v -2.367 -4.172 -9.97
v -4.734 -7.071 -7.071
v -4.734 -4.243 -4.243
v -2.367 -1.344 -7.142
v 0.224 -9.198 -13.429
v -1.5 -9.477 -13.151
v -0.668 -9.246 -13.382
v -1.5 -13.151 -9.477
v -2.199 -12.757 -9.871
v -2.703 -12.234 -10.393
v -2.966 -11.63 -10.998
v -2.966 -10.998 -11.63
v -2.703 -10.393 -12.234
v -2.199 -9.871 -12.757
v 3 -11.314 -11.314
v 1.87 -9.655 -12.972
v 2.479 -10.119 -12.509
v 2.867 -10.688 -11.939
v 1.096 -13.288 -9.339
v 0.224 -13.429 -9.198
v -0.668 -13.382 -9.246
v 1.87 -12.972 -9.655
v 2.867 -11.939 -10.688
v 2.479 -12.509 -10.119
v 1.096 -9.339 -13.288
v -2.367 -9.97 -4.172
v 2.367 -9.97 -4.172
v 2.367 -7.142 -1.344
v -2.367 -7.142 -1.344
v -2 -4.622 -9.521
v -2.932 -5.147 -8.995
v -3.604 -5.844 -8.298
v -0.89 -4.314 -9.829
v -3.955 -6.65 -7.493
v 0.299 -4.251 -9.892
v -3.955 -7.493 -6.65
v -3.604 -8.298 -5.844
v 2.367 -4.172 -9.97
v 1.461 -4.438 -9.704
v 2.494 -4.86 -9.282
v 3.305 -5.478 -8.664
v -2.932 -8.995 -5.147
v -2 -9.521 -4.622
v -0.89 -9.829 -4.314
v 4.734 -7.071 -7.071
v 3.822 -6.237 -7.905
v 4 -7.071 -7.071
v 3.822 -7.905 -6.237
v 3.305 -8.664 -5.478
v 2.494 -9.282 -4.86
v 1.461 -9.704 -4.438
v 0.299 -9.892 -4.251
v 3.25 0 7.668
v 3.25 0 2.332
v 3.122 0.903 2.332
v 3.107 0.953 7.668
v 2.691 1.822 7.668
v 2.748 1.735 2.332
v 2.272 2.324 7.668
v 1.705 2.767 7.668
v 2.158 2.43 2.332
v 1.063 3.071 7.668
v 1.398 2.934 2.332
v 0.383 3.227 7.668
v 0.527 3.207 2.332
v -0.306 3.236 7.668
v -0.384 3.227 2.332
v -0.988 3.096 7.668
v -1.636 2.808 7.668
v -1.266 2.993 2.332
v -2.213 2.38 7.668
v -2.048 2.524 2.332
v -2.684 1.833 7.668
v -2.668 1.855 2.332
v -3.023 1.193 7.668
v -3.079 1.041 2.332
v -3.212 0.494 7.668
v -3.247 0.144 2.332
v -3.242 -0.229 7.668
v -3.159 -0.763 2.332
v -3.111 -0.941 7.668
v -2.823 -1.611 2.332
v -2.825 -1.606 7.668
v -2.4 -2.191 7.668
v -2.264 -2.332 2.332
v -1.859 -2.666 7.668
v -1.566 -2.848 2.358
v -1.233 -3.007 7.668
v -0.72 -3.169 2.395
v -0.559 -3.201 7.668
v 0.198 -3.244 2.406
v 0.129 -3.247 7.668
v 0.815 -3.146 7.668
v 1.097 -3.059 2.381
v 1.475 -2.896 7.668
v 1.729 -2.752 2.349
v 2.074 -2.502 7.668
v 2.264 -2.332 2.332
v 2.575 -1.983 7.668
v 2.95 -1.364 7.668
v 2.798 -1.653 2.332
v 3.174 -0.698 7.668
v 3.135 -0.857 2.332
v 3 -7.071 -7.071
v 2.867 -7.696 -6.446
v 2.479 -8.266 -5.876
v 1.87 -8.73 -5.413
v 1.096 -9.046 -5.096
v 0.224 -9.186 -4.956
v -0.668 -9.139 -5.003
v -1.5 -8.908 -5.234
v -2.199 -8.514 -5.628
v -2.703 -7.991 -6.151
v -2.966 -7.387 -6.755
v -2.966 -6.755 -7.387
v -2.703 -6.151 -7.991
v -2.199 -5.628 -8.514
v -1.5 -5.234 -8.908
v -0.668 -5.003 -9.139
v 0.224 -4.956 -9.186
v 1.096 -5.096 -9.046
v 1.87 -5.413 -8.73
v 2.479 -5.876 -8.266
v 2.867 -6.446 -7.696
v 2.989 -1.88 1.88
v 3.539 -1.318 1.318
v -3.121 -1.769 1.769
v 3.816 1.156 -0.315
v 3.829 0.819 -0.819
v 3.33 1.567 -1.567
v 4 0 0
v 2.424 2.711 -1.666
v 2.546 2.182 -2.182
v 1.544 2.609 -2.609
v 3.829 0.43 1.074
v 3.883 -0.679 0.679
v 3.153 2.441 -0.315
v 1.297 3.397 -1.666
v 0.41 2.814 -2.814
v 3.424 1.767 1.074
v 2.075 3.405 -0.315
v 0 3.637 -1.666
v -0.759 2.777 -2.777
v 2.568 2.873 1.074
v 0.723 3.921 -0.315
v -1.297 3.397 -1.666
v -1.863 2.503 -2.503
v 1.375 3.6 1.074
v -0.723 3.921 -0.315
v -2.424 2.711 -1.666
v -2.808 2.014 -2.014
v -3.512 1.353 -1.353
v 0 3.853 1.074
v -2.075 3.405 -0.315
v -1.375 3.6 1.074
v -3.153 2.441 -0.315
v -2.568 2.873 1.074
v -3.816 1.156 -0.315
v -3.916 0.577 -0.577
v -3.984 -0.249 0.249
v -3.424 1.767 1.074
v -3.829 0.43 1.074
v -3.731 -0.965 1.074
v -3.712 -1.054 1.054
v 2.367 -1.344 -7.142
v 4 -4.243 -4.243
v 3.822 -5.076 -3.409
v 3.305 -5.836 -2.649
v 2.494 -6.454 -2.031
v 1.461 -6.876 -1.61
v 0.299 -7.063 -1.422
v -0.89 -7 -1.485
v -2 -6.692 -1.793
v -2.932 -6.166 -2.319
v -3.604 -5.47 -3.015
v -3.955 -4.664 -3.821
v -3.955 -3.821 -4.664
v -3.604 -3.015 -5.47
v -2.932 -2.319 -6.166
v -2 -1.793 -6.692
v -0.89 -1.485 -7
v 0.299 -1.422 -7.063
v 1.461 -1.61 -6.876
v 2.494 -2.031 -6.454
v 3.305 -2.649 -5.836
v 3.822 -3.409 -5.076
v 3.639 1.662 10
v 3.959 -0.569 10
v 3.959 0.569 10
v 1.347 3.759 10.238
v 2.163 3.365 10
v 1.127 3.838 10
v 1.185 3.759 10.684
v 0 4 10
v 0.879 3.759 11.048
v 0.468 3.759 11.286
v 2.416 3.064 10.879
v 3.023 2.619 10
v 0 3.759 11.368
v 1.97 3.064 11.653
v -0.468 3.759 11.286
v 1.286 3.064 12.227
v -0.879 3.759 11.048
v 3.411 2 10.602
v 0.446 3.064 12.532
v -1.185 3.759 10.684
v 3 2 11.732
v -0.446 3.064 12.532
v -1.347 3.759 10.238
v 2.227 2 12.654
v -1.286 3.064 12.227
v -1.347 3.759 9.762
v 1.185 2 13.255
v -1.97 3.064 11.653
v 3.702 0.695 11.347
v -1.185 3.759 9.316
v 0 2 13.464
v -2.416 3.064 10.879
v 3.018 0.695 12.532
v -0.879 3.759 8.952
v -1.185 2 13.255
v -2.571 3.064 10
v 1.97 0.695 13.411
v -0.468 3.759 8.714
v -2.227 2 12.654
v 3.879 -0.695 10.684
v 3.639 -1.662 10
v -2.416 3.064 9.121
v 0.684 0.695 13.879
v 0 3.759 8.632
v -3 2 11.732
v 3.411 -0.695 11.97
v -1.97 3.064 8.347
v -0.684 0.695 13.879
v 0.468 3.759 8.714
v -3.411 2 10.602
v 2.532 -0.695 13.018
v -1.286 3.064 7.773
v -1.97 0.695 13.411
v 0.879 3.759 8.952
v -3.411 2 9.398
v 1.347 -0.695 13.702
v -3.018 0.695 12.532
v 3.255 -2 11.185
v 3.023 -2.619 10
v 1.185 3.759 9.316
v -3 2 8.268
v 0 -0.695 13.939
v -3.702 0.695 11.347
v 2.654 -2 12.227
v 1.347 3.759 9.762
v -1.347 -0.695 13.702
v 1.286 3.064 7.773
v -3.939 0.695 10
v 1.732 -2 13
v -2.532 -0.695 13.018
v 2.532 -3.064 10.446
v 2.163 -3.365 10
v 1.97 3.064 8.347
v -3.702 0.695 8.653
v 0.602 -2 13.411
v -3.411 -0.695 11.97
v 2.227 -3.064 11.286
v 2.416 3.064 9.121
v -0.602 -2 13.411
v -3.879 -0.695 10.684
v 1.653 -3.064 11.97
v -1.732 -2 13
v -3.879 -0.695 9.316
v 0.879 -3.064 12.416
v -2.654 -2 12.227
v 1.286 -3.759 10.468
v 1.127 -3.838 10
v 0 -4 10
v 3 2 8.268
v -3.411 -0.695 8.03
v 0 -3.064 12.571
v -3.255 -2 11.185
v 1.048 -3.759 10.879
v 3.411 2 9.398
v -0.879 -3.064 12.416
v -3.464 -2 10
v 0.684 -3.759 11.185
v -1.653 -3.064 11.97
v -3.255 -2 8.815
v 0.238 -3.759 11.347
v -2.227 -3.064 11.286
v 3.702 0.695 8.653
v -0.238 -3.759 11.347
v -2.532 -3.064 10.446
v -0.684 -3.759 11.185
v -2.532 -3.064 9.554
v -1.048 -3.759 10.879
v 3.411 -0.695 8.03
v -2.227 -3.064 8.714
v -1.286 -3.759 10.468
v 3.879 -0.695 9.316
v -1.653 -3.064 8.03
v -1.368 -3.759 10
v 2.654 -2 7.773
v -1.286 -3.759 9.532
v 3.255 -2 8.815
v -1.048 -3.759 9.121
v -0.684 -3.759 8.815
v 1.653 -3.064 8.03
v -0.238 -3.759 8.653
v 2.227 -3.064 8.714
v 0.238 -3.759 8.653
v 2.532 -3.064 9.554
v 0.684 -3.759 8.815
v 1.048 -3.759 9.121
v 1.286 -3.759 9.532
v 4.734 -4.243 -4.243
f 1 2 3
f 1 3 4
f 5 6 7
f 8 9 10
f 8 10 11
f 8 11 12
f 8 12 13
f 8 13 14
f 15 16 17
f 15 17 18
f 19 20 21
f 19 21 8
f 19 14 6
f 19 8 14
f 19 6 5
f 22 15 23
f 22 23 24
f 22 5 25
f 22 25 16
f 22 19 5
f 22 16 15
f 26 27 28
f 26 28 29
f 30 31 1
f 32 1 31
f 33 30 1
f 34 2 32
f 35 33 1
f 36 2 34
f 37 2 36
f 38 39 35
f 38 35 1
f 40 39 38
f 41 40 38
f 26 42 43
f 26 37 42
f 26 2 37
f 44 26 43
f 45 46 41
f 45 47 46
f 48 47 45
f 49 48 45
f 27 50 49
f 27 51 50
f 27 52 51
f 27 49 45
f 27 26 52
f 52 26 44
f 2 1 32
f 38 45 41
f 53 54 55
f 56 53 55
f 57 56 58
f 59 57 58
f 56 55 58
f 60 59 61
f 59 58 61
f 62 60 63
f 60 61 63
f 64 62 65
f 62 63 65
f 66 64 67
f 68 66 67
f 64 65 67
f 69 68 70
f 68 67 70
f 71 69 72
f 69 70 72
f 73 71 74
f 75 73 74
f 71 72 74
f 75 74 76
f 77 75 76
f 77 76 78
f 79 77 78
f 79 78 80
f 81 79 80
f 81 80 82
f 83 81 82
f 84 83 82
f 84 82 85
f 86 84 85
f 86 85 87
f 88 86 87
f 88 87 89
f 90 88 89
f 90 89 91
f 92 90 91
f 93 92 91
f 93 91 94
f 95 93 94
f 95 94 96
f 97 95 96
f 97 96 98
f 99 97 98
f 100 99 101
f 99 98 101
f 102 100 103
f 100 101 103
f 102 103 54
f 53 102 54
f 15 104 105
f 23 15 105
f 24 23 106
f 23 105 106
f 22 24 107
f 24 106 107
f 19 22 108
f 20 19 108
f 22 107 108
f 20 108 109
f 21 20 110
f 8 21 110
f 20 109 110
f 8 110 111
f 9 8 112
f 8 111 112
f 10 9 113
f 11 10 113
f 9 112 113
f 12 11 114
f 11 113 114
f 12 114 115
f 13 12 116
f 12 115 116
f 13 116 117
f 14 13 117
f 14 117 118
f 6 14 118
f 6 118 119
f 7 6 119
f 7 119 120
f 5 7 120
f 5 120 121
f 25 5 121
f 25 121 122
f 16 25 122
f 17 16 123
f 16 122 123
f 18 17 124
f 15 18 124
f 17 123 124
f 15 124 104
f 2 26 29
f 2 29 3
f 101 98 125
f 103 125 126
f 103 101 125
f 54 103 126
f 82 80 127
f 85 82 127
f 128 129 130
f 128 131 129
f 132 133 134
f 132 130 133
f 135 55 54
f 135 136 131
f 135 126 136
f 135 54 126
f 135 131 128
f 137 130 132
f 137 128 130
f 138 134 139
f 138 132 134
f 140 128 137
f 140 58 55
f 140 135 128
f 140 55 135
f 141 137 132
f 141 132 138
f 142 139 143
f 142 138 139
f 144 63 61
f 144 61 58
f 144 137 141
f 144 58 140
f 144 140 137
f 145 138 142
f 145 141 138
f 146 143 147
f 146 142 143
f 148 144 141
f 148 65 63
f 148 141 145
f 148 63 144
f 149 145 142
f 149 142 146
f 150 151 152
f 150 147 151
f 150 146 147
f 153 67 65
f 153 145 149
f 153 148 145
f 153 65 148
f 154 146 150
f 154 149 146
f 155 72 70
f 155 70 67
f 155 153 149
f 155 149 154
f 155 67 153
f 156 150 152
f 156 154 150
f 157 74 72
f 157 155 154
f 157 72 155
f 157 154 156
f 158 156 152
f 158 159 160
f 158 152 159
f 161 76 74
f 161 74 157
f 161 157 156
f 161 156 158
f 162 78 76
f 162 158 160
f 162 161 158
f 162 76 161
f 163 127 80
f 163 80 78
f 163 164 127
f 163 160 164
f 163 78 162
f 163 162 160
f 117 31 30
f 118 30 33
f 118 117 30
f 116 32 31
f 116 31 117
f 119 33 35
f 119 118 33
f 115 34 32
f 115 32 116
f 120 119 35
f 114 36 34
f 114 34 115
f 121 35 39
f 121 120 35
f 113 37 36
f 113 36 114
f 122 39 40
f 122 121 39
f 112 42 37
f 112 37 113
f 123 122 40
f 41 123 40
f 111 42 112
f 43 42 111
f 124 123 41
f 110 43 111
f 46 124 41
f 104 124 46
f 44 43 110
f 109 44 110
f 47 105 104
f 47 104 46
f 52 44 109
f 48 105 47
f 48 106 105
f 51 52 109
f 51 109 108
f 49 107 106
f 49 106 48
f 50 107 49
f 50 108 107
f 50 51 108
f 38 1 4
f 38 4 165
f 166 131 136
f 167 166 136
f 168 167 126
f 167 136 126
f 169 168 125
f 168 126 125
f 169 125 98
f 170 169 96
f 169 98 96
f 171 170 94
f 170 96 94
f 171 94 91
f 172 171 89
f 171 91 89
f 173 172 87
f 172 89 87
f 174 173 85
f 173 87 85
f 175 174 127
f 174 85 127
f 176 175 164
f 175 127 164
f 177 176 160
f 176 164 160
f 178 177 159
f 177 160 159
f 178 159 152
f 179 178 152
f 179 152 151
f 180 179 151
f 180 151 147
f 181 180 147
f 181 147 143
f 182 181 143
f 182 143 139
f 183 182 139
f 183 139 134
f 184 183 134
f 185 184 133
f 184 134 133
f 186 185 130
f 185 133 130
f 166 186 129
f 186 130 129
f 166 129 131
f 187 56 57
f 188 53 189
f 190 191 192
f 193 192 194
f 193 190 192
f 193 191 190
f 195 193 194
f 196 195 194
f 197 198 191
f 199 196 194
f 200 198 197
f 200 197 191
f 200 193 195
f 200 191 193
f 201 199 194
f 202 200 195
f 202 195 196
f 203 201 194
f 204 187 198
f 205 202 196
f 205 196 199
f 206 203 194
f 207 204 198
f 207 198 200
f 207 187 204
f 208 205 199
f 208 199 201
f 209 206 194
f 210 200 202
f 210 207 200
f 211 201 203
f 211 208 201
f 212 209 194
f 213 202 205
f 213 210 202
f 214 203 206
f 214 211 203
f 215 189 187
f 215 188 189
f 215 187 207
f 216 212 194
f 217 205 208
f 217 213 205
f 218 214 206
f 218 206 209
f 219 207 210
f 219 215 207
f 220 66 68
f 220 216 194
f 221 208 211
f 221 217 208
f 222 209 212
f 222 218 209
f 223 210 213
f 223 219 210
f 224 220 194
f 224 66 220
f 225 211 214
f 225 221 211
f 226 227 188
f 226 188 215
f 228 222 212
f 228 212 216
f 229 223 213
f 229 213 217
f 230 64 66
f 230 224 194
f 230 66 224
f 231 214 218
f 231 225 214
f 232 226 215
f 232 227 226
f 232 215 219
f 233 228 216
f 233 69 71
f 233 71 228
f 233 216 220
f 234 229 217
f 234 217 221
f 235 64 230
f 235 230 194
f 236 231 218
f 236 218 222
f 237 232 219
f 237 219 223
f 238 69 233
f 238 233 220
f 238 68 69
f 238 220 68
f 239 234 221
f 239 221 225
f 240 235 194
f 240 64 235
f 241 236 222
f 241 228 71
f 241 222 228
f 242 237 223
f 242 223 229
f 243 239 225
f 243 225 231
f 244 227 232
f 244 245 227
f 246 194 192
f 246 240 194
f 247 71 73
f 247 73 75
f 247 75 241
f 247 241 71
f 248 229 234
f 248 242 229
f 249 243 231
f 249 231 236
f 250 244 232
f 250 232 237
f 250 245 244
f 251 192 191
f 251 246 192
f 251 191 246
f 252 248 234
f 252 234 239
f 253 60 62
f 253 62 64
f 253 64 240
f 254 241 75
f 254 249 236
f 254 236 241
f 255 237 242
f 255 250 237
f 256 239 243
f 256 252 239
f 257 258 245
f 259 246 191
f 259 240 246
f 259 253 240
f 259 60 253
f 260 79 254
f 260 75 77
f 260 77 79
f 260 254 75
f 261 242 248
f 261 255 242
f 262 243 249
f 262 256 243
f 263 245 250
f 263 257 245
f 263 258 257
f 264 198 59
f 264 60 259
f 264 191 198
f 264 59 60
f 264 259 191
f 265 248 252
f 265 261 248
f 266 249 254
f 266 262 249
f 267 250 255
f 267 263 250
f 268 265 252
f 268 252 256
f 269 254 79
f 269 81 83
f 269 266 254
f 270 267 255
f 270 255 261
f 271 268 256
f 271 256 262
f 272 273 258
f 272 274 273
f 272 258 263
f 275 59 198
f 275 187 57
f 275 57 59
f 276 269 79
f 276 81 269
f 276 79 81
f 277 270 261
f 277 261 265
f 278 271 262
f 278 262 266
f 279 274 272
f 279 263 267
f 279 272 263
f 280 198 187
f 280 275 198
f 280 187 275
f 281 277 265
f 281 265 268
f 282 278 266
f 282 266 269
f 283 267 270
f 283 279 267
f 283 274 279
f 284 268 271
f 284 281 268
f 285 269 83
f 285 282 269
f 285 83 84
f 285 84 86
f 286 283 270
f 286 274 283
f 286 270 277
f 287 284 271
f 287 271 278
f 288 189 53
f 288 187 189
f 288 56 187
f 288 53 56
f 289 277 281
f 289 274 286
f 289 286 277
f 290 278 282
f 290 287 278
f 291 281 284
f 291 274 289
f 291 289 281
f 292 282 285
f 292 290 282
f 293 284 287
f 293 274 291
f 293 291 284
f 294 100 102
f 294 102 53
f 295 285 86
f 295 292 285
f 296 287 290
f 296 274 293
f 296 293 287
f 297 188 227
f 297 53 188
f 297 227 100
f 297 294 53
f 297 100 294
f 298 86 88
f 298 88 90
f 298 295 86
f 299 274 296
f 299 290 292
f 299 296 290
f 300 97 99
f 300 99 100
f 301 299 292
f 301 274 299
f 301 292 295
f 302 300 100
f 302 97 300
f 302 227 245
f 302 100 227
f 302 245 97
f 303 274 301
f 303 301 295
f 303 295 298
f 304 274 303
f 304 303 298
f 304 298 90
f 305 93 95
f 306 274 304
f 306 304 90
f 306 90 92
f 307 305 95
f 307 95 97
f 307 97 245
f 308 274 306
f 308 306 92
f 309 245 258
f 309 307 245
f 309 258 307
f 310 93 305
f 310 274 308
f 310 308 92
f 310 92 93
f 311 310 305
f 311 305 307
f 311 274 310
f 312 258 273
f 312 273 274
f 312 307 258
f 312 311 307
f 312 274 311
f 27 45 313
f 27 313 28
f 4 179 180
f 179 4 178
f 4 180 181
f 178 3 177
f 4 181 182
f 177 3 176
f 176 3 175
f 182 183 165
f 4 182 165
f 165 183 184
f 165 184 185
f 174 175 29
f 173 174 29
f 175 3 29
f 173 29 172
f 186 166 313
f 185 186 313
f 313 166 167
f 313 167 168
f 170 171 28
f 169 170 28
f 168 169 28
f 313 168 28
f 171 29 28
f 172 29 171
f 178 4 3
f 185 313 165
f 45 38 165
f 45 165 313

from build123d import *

# Parameters (mm, degrees)
SKETCH_R     = 3.25
PAD_DEPTH    = 10
SKETCH001_R  = 4
PAD001_DEPTH = 10
SKETCH002_R  = 3
PAD002_DEPTH = 6
PAD003_DEPTH = 4


with BuildPart() as part:
    # Sketch → Pad (new body)
    with BuildSketch(Plane.XY):
        Circle(SKETCH_R)
    extrude(amount=PAD_DEPTH)

    # Sketch001 → Pad001 (join)
    with BuildSketch(Plane(origin=(0, 0, 0), x_dir=(1, 0, 0), z_dir=(0, -0.707107, -0.707107))):
        Circle(SKETCH001_R)
    extrude(amount=PAD001_DEPTH)

    # Sphere → Sphere (revolve)
    with BuildSketch(Plane.XZ):
        with BuildLine():
            ThreePointArc((0, -4), (4, 0), (0, 4))
            Line((0, 4), (0, -4))
        make_face()
    revolve(axis=Axis((0, 0, 0), (0, 0, 1)))

    # Sphere001 → Sphere001 (revolve)
    with BuildSketch(Plane(origin=(0, 0, 10), x_dir=(1, 0, 0), z_dir=(0, 0, -1))):
        with BuildLine():
            ThreePointArc((0, -4), (4, 0), (0, 4))
            Line((0, 4), (0, -4))
        make_face()
    revolve(axis=Axis((0, 0, 10), (0, -1, 0)))

    # Sketch002 (on Face6 of Sphere001) → Pad002 (join)
    with BuildSketch(Plane(origin=(0, -12.071068, -2.071068), x_dir=(1, 0, 0), z_dir=(0, -0.707107, -0.707107))):
        with Locations((0, -7.071068)):
            Circle(SKETCH002_R)
    extrude(amount=PAD002_DEPTH)

    # Sketch003 (on Face6 of Pad002) → Pad003 (join)
    with BuildSketch(Plane(origin=(0, -12.071068, -2.071068), x_dir=(1, 0, 0), z_dir=(0, -0.707107, -0.707107))):
        Polygon((2.367136, -2.971068), (-2.367136, -2.971068), (-4.734272, -7.071068), (-2.367136, -11.171068), (2.367136, -11.171068), (4.734272, -7.071068), align=None)
    extrude(amount=-PAD003_DEPTH)


solid = part.part
